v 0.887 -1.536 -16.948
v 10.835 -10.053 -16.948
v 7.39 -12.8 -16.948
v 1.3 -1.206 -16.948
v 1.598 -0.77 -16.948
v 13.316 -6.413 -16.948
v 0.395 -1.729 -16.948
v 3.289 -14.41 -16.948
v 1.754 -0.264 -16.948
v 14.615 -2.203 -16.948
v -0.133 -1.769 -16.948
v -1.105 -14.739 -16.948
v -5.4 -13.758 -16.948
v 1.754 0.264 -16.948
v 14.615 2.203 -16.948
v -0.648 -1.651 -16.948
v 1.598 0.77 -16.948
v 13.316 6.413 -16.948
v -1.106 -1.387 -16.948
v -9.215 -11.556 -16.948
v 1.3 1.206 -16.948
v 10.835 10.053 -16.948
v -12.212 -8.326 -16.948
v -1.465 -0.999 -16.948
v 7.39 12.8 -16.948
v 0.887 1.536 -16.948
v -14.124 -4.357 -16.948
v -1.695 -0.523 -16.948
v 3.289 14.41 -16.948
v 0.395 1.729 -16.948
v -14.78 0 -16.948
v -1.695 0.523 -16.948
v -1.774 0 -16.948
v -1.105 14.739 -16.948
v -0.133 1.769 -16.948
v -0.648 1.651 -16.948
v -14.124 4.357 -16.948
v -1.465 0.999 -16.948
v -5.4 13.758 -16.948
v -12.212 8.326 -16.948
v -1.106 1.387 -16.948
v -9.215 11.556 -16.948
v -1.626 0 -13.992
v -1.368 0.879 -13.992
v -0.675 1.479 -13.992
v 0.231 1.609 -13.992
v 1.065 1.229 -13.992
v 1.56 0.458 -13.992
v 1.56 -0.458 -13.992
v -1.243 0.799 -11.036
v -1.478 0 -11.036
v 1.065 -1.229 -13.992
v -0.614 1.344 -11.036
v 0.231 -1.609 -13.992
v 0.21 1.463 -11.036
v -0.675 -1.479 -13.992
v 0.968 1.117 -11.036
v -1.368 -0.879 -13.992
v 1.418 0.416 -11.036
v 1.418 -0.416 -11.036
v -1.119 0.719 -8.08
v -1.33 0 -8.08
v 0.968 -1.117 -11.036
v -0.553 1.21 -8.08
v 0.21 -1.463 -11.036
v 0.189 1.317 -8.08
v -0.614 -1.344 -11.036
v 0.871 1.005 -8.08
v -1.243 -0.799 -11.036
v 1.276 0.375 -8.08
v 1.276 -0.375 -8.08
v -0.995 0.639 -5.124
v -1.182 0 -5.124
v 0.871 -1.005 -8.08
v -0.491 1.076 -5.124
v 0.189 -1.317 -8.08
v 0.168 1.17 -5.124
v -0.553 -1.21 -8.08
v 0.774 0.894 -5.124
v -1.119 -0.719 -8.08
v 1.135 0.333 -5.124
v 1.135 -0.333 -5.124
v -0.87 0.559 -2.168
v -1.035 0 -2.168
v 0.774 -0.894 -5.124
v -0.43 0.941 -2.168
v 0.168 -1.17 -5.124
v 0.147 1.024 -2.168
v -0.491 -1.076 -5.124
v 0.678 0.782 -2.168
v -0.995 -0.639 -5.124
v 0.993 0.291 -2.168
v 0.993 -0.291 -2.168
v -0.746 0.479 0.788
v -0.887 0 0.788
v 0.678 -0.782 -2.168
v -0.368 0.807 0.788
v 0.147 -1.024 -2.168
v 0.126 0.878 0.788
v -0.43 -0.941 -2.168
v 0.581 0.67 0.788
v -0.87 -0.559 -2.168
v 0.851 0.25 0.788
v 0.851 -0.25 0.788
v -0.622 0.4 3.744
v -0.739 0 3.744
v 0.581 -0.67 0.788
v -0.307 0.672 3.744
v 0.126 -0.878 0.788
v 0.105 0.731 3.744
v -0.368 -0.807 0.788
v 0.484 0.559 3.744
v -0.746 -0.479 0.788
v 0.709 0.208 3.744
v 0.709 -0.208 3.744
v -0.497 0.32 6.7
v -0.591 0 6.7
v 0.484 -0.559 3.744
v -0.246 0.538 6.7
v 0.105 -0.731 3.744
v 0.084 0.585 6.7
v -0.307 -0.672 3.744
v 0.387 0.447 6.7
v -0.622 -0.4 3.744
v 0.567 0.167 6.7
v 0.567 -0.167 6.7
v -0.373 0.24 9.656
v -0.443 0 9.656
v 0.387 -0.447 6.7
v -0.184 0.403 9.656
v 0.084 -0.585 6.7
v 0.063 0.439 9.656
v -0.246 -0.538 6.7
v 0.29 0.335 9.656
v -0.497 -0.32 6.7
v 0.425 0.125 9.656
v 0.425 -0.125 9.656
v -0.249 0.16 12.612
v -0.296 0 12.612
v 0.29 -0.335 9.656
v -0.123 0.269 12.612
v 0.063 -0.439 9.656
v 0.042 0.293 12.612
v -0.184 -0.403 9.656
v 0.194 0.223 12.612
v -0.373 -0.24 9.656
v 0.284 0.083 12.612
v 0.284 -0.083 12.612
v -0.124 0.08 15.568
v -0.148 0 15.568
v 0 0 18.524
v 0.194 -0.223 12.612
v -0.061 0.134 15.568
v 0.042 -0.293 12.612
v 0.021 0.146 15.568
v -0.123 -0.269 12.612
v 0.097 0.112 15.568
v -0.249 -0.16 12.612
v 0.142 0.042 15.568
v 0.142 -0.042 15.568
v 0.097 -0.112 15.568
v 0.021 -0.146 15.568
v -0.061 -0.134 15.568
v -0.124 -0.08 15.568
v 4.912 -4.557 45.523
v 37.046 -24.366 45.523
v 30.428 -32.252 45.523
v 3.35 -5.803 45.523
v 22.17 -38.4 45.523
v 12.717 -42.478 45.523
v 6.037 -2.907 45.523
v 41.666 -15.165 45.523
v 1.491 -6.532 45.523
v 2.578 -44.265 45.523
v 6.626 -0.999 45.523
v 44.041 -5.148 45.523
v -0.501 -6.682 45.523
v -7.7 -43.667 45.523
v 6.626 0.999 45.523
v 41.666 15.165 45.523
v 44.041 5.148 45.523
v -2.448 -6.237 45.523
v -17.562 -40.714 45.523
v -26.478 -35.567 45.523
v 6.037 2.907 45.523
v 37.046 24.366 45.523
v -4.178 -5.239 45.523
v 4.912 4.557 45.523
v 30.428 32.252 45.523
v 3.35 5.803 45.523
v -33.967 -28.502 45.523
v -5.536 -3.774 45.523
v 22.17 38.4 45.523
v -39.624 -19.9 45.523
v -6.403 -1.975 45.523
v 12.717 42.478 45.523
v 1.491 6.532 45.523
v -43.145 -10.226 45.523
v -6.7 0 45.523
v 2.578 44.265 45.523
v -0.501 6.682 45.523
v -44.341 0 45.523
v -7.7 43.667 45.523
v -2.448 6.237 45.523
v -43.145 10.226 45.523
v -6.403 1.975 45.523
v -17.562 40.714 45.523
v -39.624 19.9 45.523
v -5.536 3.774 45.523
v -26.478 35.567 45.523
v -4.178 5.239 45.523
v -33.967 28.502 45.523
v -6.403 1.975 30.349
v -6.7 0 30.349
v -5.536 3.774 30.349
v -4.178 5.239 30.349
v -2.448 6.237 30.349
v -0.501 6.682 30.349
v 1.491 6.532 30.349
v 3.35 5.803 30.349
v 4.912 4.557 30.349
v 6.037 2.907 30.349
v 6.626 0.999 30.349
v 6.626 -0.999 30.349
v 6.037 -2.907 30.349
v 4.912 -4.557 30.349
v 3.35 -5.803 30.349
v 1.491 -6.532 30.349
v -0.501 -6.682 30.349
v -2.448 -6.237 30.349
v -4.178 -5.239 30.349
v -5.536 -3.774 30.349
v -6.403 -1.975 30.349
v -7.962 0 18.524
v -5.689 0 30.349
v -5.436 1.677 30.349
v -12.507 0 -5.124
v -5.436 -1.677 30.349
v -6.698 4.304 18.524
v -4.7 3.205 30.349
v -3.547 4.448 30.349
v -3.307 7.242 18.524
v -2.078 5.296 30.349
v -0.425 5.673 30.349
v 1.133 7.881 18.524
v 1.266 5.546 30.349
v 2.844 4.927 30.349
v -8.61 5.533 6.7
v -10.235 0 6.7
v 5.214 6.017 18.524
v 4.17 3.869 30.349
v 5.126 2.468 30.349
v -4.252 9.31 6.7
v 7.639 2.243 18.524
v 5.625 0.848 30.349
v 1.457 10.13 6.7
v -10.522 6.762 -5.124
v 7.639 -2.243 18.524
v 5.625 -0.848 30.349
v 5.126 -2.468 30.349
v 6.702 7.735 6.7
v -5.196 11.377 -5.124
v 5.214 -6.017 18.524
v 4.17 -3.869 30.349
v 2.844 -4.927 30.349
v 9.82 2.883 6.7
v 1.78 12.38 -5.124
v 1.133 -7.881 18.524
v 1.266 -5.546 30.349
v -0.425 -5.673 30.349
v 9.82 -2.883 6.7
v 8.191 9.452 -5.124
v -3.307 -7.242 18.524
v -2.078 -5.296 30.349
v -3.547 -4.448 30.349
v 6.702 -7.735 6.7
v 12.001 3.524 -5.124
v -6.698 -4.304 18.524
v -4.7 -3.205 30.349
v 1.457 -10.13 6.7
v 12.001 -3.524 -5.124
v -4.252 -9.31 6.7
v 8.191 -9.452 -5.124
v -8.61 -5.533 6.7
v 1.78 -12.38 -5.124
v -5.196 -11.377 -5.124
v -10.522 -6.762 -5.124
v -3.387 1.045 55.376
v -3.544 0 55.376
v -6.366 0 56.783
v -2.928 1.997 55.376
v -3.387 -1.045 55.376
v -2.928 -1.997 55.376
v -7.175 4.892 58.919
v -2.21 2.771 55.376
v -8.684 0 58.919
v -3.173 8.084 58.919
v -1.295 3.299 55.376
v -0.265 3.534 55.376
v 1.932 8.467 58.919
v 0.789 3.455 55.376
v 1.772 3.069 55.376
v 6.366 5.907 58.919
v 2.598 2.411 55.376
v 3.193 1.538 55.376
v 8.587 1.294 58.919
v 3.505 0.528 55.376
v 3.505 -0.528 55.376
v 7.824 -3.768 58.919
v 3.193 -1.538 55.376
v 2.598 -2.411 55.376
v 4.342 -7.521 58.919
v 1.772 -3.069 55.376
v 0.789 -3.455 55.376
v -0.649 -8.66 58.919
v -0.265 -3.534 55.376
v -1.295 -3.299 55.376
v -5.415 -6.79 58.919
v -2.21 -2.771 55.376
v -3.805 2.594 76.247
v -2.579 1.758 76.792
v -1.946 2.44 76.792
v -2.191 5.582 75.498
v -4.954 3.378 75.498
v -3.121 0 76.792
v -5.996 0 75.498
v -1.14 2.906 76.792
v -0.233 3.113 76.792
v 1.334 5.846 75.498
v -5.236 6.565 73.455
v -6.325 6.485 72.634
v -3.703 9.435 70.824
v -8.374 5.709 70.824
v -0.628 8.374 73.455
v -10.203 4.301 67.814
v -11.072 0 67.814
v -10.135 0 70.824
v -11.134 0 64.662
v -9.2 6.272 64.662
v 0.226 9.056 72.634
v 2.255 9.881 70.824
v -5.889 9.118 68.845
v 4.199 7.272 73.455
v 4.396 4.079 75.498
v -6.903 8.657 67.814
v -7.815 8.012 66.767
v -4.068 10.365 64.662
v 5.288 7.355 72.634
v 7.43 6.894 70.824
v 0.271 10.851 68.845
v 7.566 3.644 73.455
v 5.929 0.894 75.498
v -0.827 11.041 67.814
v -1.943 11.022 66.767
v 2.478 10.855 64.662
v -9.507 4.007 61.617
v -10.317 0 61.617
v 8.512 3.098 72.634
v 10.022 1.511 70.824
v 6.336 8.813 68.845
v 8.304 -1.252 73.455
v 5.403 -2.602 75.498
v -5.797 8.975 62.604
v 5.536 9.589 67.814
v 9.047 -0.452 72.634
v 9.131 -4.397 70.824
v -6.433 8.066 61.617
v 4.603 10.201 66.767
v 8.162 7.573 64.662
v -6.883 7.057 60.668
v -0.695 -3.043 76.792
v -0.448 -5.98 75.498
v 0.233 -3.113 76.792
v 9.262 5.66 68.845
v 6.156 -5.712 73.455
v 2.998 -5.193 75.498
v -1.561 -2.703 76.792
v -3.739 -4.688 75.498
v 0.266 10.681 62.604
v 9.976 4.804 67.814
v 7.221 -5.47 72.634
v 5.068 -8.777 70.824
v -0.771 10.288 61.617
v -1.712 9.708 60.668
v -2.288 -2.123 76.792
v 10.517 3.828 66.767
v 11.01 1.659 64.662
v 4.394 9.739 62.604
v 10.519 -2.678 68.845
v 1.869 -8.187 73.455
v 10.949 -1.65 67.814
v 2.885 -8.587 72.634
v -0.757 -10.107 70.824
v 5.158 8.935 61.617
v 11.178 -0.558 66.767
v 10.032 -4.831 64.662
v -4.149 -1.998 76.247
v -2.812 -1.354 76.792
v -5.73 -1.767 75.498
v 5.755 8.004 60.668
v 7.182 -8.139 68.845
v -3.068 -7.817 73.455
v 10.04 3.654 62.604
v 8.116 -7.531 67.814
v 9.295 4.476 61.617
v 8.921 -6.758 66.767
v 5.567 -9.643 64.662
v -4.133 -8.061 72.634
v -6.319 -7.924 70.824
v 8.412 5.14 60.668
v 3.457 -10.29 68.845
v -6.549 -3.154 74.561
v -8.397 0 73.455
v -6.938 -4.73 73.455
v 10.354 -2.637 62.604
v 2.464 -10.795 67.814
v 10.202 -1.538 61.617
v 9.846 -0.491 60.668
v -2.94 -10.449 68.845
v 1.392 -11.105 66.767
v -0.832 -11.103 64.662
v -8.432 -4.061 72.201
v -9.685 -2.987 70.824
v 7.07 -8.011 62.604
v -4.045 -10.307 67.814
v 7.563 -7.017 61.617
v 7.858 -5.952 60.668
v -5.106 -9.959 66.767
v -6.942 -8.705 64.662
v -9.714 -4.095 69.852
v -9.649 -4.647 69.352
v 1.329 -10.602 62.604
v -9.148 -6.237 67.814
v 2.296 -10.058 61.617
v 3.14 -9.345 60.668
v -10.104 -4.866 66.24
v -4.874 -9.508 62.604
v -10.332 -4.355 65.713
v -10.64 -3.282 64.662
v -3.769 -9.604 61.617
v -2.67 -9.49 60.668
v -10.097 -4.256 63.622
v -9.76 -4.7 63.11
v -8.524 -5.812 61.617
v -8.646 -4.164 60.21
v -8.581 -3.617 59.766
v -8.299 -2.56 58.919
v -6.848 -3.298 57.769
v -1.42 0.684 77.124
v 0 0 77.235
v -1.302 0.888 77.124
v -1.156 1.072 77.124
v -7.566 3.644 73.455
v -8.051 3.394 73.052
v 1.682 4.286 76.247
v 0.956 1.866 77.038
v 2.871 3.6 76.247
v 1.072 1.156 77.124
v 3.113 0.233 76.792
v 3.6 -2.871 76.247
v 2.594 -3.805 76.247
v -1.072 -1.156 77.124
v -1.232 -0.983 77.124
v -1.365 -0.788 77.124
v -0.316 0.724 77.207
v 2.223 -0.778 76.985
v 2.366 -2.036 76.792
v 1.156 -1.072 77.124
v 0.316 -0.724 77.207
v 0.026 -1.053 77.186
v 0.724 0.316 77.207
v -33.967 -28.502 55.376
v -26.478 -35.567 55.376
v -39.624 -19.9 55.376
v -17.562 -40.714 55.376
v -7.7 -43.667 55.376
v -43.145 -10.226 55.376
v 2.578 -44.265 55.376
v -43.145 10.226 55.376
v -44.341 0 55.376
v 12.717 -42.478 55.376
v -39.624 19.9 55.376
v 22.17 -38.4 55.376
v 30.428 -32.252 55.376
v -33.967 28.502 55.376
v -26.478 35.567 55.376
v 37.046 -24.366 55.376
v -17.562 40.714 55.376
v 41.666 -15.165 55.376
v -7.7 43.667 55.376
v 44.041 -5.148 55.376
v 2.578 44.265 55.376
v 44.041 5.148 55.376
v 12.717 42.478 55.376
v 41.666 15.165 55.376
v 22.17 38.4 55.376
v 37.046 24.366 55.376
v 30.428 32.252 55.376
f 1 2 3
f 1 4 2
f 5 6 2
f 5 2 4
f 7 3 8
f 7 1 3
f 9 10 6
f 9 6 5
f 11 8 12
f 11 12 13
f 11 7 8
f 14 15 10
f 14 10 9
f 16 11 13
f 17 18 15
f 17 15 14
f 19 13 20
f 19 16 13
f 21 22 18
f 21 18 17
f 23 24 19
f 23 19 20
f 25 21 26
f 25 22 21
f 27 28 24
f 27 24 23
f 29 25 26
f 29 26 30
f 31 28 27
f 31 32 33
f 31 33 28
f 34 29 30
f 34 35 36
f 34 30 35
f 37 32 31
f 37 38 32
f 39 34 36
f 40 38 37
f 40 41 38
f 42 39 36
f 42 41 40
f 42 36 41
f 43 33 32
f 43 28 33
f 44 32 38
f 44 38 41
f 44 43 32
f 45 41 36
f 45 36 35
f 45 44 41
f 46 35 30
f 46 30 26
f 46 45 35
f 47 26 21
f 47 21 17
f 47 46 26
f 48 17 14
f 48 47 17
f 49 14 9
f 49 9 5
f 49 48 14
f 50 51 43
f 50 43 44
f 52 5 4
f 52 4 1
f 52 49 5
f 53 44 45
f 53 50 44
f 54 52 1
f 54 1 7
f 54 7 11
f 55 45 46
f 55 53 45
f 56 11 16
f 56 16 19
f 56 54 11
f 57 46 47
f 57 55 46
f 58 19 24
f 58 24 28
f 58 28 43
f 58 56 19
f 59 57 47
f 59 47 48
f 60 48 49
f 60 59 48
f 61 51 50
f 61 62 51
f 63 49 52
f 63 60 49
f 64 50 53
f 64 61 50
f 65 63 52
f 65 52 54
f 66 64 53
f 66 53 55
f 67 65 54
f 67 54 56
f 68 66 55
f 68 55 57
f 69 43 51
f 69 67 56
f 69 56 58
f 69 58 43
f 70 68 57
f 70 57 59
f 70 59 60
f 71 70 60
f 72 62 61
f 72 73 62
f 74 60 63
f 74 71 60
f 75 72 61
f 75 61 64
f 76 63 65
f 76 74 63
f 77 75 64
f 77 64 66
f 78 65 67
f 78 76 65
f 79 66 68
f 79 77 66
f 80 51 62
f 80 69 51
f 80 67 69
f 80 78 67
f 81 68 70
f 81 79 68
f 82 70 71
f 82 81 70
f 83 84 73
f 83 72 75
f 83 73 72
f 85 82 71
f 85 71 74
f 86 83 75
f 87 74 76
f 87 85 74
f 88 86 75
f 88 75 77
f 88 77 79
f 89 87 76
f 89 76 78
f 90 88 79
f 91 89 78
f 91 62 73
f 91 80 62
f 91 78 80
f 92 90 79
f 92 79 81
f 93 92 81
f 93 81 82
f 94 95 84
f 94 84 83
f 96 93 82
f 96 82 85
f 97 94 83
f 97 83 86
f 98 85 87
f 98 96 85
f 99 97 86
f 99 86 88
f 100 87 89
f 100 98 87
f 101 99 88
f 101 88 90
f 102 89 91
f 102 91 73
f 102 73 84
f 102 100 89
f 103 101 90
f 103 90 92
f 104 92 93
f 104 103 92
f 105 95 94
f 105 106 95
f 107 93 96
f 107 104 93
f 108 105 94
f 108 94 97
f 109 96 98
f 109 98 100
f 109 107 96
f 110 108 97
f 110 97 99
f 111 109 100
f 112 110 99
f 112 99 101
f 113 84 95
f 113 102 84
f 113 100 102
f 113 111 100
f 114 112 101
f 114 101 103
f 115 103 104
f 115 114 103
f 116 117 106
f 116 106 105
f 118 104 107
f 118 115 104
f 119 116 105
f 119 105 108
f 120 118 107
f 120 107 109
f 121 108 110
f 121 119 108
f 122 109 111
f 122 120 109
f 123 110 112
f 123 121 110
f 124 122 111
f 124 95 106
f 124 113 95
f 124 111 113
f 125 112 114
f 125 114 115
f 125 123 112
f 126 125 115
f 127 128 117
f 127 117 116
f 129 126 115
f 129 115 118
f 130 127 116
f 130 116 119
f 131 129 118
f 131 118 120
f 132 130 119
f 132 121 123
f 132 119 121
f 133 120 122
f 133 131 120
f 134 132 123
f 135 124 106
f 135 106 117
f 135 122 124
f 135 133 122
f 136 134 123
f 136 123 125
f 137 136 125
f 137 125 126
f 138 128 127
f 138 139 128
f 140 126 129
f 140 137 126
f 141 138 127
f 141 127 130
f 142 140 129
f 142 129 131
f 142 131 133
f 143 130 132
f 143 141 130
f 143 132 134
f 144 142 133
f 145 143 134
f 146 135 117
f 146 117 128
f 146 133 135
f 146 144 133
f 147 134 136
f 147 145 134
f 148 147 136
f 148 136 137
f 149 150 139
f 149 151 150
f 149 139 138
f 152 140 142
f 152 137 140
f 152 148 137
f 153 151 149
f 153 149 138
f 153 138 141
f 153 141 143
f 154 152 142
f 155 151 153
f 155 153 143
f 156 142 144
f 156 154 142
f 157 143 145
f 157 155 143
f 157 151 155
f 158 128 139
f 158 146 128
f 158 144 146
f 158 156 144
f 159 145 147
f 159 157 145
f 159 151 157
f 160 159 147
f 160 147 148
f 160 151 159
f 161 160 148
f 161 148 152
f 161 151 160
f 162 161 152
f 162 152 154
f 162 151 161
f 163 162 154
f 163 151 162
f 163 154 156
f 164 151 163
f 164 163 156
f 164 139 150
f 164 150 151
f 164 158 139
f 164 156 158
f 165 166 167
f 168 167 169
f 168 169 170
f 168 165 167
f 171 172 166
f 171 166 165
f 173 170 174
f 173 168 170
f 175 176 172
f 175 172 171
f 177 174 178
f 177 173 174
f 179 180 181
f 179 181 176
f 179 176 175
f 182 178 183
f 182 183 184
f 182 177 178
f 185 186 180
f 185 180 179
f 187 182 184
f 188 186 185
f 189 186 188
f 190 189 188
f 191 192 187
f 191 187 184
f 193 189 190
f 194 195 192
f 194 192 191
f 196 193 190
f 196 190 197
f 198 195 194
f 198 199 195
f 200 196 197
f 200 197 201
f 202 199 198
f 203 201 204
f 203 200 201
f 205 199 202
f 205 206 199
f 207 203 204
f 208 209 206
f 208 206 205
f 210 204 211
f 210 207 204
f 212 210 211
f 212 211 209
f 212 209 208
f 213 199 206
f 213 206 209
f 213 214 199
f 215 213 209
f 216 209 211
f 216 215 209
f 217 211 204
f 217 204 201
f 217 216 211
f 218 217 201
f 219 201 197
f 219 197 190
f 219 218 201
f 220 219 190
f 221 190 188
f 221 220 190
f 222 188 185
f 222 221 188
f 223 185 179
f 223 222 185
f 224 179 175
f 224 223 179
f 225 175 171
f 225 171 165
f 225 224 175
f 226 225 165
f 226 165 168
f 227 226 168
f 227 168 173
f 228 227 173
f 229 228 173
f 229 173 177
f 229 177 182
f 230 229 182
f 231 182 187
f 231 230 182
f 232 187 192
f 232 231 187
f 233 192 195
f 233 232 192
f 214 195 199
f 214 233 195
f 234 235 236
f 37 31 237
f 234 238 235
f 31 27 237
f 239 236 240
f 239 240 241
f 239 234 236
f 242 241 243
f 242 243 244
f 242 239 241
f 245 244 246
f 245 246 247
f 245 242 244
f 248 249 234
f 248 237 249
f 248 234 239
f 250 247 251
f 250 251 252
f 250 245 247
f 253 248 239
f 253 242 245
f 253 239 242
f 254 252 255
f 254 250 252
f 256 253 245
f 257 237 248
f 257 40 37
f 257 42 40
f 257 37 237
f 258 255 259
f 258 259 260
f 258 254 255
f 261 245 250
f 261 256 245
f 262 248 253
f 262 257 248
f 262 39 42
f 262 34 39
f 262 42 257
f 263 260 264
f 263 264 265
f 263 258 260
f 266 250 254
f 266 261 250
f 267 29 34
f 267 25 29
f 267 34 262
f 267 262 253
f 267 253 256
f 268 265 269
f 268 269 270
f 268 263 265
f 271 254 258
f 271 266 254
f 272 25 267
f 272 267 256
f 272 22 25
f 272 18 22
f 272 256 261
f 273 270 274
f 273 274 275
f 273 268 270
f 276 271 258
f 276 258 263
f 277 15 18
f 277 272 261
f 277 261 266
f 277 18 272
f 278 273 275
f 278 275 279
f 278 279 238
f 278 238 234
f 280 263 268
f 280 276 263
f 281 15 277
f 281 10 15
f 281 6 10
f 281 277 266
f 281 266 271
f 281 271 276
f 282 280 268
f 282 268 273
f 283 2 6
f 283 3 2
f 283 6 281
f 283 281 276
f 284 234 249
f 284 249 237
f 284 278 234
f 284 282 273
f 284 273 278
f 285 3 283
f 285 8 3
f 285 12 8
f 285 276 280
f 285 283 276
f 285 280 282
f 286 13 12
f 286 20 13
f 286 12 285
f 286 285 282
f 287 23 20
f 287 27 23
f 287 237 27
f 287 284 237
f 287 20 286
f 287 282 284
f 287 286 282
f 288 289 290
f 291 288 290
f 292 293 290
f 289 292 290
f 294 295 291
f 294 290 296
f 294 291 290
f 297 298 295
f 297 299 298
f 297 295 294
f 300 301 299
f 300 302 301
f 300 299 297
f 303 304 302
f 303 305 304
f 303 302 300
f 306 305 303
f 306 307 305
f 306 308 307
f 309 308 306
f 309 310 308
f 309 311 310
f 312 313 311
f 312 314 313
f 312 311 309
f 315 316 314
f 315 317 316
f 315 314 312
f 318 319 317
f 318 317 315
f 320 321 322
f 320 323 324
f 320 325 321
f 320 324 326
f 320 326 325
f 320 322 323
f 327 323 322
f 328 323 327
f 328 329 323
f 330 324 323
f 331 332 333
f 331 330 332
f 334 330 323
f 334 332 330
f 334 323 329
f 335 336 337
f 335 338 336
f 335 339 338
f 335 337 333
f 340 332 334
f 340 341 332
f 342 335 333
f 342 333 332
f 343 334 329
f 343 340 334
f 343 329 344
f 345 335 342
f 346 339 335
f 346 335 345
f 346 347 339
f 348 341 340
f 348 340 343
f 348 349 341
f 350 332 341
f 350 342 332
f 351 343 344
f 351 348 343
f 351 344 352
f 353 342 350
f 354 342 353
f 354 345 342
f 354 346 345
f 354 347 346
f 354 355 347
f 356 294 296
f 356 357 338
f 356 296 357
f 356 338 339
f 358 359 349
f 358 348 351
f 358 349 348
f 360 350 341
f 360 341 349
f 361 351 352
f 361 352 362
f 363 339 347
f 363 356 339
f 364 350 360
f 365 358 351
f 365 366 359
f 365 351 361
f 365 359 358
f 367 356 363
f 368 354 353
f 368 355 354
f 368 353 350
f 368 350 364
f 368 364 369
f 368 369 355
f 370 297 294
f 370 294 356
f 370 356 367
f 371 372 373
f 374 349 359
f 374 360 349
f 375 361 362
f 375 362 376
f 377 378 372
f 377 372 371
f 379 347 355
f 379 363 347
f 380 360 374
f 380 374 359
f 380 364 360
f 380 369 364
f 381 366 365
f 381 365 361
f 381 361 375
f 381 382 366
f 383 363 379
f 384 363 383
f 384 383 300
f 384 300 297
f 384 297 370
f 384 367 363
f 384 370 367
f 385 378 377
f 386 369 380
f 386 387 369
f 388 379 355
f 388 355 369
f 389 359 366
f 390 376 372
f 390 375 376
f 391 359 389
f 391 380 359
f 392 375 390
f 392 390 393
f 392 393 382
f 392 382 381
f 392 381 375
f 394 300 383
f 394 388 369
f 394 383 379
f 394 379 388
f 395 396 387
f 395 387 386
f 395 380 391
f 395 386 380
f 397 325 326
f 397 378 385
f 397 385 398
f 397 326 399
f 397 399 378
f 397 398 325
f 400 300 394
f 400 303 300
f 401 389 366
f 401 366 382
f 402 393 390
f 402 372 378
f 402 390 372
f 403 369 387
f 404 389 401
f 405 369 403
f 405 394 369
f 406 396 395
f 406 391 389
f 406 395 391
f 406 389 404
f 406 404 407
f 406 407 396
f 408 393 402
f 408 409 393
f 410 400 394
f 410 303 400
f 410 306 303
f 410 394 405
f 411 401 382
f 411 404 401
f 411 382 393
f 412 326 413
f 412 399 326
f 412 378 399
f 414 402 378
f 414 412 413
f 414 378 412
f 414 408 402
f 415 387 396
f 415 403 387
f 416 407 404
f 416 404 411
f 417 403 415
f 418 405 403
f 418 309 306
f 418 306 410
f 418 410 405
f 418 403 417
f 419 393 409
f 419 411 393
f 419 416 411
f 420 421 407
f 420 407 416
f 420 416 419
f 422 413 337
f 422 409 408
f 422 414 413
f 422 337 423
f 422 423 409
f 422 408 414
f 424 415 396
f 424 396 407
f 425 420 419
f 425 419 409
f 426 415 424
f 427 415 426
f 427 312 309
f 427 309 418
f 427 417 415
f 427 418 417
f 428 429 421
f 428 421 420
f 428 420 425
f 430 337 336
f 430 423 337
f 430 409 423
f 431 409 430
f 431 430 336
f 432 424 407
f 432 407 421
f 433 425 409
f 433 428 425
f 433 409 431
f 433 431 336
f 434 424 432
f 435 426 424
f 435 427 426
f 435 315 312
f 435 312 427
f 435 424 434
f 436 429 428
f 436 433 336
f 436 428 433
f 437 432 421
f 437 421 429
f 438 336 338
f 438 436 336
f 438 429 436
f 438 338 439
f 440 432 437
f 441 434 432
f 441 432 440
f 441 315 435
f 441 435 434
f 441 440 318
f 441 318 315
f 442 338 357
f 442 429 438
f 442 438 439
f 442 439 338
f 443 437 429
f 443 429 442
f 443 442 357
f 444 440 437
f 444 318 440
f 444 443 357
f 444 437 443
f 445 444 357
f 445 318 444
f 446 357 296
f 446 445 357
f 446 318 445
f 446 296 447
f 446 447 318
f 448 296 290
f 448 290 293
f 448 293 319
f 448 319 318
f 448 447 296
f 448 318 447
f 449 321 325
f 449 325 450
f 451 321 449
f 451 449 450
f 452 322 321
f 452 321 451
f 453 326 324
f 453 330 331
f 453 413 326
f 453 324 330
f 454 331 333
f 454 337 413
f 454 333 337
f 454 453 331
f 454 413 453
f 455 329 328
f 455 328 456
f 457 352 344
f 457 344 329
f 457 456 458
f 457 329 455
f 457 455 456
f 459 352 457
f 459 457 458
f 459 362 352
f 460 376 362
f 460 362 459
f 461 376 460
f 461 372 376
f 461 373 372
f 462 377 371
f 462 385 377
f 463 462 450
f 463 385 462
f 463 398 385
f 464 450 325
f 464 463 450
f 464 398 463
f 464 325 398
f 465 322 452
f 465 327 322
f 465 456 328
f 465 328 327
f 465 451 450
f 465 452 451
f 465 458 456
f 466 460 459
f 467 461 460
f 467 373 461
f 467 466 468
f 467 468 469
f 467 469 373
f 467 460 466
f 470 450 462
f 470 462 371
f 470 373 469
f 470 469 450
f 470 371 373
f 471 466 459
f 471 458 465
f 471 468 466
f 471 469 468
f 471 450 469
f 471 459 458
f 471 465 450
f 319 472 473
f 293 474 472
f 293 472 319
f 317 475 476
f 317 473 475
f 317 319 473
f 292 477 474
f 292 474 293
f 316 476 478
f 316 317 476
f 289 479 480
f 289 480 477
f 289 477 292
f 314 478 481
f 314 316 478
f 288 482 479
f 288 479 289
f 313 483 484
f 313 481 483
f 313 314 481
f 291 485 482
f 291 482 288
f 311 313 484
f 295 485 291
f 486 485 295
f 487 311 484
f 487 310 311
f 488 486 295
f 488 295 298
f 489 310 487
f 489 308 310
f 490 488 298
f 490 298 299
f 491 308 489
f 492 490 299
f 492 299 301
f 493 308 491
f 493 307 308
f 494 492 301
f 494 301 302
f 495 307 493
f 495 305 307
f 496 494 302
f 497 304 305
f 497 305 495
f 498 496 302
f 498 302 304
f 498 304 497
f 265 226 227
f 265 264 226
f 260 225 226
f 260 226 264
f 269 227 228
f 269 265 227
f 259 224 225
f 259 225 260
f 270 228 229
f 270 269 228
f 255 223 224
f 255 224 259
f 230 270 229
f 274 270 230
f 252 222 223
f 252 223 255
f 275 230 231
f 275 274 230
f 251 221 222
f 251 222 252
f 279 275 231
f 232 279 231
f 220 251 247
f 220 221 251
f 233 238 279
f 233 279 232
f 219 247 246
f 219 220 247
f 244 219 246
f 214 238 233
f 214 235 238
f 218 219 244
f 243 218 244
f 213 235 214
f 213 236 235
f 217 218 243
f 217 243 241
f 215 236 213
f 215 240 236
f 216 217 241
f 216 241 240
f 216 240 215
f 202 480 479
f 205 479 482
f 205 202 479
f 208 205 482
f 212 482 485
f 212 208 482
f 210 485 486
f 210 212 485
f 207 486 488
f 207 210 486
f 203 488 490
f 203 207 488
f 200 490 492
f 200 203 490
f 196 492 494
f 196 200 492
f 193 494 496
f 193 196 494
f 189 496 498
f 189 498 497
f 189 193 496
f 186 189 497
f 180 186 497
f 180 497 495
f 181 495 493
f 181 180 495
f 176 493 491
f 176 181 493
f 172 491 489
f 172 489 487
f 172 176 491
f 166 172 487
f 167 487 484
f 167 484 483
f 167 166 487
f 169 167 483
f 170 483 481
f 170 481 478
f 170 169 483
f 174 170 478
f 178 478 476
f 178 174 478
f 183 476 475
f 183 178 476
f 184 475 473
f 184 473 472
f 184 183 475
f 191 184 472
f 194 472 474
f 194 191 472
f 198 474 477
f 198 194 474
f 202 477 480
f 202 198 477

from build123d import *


with BuildPart() as f1:
    # F0 (on Front) → F1 (revolve)
    with BuildSketch(Plane.XZ):
        with BuildLine():
            Line((0, 54.801697), (0, 55.376381))
            Line((0, 55.376381), (-3.544281, 55.376381))
            ThreePointArc((-3.544281, 55.376381), (-1.795285, 54.9463), (0, 54.801697))
        make_face()
        with BuildLine():
            Line((-3.544281, 55.376381), (0, 55.376381))
            Line((0, 55.376381), (0, 77.235242))
            ThreePointArc((0, 77.235242), (-11.072169, 67.813754), (-3.544281, 55.376381))
        make_face()
        with BuildLine():
            ThreePointArc((0, 54.801697), (-1.795285, 54.9463), (-3.544281, 55.376381))
            Line((-3.544281, 55.376381), (-5.688893, 55.376381))
            Line((-5.688893, 55.376381), (-44.340517, 55.376381))
            Line((-44.340517, 55.376381), (-44.340517, 45.523312))
            Line((-44.340517, 45.523312), (-6.700345, 45.523312))
            Line((-6.700345, 45.523312), (-6.700345, 30.348621))
            Line((-6.700345, 30.348621), (-5.688893, 30.348621))
            Line((-5.688893, 30.348621), (0, 30.348621))
            Line((0, 30.348621), (0, 54.801697))
        make_face()
        Polygon((0, 18.524483), (0, 30.348621), (-5.688893, 30.348621), (-14.780172, -16.947931), (-1.77362, -16.947931), align=None)
    revolve(axis=Axis((0, 0, 47.879862), (0, 0, -1)))


solid = f1.part
